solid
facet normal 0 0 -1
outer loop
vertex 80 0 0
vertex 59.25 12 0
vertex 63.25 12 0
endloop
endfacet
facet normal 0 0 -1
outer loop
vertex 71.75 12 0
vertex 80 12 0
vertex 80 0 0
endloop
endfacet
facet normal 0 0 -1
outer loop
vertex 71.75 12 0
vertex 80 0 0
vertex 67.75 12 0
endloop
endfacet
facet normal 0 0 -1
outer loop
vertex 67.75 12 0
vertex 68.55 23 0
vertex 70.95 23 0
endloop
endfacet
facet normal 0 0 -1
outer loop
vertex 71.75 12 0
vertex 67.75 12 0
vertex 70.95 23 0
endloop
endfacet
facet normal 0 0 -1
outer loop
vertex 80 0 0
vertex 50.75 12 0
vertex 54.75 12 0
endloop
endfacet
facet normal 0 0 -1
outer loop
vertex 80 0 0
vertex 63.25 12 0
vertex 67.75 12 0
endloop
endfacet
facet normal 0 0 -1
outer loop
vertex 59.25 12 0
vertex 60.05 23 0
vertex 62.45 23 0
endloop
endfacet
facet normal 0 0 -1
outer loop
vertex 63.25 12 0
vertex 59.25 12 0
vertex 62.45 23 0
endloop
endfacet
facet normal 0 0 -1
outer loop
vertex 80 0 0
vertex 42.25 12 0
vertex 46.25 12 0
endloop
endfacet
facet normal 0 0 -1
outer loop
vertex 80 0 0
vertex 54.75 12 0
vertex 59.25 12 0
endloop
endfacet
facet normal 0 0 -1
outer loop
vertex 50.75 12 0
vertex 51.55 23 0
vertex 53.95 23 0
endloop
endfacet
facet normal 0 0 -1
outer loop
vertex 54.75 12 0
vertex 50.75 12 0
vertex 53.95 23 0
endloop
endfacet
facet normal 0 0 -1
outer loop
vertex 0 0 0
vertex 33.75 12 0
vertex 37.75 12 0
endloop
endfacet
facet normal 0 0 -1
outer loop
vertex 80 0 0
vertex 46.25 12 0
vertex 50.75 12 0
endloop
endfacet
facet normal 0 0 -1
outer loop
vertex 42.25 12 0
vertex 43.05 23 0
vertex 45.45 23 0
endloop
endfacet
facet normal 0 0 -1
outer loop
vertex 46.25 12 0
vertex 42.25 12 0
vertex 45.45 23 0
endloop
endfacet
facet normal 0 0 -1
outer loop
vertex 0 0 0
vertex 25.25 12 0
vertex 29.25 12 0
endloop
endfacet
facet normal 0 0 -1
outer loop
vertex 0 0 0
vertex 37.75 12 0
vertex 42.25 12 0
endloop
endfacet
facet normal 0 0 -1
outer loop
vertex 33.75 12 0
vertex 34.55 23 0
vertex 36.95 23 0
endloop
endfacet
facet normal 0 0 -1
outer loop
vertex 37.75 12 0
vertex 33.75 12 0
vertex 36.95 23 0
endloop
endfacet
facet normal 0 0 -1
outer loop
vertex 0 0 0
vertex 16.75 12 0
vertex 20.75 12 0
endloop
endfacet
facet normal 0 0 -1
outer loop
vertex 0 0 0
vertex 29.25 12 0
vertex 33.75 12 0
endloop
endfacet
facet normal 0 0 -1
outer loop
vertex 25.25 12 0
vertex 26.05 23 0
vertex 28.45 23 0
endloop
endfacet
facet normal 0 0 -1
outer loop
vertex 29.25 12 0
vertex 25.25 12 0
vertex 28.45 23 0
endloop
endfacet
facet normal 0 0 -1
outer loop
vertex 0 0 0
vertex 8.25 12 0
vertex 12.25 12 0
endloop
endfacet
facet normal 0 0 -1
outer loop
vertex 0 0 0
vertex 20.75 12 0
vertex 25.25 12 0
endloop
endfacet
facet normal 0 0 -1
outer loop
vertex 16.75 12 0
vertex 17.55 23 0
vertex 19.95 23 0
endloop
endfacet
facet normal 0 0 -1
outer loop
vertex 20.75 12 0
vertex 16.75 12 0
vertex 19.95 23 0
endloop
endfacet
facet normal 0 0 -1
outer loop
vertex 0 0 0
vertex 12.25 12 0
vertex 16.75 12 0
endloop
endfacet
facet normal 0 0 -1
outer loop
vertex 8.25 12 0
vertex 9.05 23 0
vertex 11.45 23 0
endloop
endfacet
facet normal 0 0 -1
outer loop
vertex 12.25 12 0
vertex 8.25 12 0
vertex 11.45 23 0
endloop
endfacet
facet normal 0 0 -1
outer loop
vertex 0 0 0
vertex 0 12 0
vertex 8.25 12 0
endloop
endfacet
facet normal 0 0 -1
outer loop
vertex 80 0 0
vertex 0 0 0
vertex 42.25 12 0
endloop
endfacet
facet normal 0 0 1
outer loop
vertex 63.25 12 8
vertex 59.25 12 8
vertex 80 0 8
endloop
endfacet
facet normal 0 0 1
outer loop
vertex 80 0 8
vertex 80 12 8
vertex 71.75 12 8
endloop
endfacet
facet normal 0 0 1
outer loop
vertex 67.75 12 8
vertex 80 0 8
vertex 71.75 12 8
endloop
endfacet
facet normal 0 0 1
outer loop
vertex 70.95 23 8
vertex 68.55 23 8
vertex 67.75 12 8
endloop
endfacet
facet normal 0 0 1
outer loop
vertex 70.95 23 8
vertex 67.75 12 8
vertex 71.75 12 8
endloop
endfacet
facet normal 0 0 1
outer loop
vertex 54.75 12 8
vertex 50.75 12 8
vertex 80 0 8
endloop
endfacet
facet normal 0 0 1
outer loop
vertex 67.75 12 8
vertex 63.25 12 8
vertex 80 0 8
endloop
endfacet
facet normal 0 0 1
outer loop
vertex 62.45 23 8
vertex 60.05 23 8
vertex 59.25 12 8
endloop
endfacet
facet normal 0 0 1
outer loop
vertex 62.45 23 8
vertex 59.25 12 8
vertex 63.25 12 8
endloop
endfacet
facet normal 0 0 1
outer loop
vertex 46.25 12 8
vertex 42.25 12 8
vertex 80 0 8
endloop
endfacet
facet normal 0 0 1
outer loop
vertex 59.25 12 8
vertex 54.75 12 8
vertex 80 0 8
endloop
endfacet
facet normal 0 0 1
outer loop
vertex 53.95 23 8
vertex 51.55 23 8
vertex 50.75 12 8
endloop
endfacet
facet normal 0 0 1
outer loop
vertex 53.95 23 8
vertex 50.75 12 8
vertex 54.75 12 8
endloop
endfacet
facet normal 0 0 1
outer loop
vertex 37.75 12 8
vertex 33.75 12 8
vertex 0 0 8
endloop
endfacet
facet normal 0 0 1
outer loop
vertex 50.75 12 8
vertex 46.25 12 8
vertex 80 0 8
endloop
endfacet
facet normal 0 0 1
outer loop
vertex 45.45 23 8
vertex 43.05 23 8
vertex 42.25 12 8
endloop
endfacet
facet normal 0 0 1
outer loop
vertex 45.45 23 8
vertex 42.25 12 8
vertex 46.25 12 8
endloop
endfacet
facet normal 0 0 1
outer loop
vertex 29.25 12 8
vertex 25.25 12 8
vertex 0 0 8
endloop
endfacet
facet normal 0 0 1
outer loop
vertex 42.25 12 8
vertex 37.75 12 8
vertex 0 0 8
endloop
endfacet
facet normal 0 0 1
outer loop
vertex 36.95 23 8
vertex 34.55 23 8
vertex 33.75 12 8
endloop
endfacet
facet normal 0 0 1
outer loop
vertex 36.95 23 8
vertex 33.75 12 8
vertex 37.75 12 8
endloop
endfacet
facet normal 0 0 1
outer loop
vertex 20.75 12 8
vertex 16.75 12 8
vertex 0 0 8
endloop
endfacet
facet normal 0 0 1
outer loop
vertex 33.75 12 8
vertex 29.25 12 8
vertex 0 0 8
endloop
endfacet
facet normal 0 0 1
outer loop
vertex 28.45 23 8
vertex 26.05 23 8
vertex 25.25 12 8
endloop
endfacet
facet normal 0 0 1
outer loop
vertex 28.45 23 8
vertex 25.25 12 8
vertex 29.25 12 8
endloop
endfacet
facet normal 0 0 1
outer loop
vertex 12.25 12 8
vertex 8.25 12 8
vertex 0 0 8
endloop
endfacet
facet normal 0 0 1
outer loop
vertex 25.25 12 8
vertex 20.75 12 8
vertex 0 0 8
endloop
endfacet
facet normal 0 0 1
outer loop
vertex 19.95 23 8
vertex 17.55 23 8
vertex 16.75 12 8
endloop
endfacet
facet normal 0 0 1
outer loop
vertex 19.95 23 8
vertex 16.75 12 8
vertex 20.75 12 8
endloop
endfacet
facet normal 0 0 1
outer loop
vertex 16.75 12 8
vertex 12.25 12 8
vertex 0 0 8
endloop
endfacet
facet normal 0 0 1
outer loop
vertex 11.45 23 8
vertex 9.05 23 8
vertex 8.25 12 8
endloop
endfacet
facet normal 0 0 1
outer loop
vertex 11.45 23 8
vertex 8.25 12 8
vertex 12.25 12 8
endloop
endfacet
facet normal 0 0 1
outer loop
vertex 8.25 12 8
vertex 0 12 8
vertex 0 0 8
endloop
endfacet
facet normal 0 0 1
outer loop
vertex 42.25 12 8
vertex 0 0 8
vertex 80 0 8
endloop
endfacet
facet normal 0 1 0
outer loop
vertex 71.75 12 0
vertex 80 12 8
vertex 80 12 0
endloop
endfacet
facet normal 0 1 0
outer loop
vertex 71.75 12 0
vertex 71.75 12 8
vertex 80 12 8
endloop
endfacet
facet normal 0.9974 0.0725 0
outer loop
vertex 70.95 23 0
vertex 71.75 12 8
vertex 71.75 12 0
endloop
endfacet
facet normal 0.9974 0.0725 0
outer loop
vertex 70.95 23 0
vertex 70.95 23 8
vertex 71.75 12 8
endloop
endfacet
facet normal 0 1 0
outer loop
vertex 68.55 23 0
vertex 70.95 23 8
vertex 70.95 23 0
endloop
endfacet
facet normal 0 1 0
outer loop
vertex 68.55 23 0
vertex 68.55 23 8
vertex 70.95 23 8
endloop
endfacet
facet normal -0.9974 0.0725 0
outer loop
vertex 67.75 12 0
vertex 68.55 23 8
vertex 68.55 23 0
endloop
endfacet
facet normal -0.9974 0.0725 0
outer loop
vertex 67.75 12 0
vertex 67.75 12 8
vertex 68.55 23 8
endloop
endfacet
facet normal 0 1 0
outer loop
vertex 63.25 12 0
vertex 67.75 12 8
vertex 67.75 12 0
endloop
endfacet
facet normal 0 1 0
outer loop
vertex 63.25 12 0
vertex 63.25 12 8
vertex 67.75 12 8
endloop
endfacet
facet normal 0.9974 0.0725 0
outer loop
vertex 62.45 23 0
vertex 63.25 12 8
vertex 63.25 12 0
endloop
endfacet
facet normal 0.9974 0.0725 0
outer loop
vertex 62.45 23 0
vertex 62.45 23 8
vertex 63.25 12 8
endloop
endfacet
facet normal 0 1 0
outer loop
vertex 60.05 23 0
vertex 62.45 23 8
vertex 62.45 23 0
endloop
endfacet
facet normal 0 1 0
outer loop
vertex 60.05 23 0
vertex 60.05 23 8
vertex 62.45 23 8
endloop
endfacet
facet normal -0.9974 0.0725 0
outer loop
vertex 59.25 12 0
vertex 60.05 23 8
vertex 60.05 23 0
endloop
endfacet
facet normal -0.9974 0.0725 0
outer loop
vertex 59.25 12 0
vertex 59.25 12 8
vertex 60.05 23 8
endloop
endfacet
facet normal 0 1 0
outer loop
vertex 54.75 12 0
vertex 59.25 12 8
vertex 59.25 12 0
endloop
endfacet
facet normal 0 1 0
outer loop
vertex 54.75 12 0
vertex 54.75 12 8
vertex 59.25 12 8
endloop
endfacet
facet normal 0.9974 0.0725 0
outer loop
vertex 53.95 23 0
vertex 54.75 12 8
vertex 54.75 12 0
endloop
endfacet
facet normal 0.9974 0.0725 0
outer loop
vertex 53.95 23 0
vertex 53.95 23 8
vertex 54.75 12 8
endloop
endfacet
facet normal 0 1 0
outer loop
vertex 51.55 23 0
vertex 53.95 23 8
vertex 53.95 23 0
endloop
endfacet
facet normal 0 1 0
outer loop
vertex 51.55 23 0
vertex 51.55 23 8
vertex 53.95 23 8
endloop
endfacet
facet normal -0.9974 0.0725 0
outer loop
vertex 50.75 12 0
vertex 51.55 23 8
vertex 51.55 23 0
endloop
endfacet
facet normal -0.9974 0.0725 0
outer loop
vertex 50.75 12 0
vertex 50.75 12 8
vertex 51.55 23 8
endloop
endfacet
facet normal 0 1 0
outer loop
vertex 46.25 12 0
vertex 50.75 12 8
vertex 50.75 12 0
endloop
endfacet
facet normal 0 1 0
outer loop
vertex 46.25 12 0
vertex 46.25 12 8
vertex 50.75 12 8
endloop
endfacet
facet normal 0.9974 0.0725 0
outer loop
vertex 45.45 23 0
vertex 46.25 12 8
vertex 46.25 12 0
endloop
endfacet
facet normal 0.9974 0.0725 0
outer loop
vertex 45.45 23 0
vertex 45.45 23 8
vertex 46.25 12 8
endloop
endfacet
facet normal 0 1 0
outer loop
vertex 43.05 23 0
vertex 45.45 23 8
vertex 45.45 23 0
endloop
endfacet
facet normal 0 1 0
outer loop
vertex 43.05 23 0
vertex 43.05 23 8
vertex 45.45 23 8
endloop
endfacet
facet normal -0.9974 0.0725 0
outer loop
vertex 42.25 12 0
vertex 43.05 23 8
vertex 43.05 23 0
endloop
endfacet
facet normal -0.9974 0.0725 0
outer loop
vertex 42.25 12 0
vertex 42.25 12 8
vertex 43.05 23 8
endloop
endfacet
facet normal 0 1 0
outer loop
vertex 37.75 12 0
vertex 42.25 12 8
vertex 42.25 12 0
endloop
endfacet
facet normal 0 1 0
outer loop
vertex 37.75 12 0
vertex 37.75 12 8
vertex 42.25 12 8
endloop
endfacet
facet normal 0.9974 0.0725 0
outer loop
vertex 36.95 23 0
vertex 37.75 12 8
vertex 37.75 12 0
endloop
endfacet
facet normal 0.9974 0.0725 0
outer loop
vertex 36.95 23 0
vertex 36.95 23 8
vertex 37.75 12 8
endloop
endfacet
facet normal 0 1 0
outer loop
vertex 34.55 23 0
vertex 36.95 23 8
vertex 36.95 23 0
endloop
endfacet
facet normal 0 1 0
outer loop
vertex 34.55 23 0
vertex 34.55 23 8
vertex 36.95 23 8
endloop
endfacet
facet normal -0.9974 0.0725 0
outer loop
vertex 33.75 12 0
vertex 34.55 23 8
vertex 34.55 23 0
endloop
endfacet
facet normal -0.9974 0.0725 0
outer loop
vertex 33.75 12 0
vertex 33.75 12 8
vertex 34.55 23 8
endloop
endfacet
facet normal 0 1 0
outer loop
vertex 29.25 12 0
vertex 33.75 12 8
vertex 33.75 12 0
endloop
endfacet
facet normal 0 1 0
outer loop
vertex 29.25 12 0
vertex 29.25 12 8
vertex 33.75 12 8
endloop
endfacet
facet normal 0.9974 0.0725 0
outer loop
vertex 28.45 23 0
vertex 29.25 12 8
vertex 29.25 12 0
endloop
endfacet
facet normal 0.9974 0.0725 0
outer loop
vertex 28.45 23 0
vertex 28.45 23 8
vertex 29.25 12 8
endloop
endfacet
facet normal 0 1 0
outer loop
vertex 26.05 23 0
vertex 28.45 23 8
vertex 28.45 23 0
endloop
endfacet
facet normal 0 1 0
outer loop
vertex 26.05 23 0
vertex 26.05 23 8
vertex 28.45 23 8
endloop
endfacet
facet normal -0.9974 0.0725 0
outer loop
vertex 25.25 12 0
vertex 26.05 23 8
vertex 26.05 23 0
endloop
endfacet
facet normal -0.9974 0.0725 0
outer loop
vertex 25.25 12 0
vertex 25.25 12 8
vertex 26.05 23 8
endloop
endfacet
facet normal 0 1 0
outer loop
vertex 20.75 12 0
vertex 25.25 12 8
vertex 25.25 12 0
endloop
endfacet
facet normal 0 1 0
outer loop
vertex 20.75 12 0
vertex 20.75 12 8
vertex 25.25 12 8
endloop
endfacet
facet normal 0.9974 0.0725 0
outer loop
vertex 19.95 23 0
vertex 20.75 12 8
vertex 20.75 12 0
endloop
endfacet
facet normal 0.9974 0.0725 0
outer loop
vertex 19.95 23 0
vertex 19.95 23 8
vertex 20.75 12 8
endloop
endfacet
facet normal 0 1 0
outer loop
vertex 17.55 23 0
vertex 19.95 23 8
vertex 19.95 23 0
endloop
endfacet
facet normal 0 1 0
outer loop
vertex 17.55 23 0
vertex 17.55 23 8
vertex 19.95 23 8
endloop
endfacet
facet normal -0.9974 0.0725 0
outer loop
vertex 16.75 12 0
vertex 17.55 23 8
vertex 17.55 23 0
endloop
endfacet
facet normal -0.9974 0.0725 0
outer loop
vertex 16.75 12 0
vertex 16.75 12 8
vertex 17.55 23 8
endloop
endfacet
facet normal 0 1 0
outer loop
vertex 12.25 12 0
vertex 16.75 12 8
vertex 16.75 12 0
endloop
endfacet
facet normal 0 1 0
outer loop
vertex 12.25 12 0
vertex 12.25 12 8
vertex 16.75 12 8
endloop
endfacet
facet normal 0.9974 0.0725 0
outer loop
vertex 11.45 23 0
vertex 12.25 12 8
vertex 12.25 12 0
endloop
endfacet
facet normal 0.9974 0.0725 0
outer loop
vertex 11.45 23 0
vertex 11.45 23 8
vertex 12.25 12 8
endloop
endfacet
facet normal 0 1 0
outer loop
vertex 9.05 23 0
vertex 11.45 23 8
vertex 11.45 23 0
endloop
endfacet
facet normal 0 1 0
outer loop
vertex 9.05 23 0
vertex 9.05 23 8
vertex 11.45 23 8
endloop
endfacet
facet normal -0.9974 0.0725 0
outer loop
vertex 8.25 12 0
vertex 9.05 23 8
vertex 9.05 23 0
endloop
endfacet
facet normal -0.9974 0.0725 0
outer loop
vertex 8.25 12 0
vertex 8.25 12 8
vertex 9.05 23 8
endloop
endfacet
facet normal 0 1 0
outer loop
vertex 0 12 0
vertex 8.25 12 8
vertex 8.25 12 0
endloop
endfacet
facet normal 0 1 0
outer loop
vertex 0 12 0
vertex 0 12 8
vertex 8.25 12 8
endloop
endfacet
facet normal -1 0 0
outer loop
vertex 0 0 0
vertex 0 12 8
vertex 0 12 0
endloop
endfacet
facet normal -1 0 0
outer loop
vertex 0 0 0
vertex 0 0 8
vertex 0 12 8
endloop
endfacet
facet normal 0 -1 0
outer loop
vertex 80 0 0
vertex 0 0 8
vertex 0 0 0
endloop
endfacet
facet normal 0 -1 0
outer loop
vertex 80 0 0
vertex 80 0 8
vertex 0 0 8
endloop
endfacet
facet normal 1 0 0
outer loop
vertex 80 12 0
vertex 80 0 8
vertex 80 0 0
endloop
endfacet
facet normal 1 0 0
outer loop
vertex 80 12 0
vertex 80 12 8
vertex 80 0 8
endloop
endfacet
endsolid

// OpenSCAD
$fn = 32;

// ----------------------------------------------------------------------
// Gear rack: 8 teeth on a 80 mm bar, pitch 8.5 mm
// ----------------------------------------------------------------------

// --- parameters (mm) ---
profile_height = 8;       // extrusion height
profile_points = 36;      // points of the closed outline

profile = [[0, 0], [80, 0], [80, 12], [71.75, 12], [70.95, 23], [68.55, 23], [67.75, 12], [63.25, 12], [62.45, 23], [60.05, 23], [59.25, 12], [54.75, 12], [53.95, 23], [51.55, 23], [50.75, 12], [46.25, 12], [45.45, 23], [43.05, 23], [42.25, 12], [37.75, 12], [36.95, 23], [34.55, 23], [33.75, 12], [29.25, 12], [28.45, 23], [26.05, 23], [25.25, 12], [20.75, 12], [19.95, 23], [17.55, 23], [16.75, 12], [12.25, 12], [11.45, 23], [9.05, 23], [8.25, 12], [0, 12]];  // single closed polygon, 36 points, counter clockwise

// --- the one profile operation ---
linear_extrude(height = profile_height) polygon(points = profile);
